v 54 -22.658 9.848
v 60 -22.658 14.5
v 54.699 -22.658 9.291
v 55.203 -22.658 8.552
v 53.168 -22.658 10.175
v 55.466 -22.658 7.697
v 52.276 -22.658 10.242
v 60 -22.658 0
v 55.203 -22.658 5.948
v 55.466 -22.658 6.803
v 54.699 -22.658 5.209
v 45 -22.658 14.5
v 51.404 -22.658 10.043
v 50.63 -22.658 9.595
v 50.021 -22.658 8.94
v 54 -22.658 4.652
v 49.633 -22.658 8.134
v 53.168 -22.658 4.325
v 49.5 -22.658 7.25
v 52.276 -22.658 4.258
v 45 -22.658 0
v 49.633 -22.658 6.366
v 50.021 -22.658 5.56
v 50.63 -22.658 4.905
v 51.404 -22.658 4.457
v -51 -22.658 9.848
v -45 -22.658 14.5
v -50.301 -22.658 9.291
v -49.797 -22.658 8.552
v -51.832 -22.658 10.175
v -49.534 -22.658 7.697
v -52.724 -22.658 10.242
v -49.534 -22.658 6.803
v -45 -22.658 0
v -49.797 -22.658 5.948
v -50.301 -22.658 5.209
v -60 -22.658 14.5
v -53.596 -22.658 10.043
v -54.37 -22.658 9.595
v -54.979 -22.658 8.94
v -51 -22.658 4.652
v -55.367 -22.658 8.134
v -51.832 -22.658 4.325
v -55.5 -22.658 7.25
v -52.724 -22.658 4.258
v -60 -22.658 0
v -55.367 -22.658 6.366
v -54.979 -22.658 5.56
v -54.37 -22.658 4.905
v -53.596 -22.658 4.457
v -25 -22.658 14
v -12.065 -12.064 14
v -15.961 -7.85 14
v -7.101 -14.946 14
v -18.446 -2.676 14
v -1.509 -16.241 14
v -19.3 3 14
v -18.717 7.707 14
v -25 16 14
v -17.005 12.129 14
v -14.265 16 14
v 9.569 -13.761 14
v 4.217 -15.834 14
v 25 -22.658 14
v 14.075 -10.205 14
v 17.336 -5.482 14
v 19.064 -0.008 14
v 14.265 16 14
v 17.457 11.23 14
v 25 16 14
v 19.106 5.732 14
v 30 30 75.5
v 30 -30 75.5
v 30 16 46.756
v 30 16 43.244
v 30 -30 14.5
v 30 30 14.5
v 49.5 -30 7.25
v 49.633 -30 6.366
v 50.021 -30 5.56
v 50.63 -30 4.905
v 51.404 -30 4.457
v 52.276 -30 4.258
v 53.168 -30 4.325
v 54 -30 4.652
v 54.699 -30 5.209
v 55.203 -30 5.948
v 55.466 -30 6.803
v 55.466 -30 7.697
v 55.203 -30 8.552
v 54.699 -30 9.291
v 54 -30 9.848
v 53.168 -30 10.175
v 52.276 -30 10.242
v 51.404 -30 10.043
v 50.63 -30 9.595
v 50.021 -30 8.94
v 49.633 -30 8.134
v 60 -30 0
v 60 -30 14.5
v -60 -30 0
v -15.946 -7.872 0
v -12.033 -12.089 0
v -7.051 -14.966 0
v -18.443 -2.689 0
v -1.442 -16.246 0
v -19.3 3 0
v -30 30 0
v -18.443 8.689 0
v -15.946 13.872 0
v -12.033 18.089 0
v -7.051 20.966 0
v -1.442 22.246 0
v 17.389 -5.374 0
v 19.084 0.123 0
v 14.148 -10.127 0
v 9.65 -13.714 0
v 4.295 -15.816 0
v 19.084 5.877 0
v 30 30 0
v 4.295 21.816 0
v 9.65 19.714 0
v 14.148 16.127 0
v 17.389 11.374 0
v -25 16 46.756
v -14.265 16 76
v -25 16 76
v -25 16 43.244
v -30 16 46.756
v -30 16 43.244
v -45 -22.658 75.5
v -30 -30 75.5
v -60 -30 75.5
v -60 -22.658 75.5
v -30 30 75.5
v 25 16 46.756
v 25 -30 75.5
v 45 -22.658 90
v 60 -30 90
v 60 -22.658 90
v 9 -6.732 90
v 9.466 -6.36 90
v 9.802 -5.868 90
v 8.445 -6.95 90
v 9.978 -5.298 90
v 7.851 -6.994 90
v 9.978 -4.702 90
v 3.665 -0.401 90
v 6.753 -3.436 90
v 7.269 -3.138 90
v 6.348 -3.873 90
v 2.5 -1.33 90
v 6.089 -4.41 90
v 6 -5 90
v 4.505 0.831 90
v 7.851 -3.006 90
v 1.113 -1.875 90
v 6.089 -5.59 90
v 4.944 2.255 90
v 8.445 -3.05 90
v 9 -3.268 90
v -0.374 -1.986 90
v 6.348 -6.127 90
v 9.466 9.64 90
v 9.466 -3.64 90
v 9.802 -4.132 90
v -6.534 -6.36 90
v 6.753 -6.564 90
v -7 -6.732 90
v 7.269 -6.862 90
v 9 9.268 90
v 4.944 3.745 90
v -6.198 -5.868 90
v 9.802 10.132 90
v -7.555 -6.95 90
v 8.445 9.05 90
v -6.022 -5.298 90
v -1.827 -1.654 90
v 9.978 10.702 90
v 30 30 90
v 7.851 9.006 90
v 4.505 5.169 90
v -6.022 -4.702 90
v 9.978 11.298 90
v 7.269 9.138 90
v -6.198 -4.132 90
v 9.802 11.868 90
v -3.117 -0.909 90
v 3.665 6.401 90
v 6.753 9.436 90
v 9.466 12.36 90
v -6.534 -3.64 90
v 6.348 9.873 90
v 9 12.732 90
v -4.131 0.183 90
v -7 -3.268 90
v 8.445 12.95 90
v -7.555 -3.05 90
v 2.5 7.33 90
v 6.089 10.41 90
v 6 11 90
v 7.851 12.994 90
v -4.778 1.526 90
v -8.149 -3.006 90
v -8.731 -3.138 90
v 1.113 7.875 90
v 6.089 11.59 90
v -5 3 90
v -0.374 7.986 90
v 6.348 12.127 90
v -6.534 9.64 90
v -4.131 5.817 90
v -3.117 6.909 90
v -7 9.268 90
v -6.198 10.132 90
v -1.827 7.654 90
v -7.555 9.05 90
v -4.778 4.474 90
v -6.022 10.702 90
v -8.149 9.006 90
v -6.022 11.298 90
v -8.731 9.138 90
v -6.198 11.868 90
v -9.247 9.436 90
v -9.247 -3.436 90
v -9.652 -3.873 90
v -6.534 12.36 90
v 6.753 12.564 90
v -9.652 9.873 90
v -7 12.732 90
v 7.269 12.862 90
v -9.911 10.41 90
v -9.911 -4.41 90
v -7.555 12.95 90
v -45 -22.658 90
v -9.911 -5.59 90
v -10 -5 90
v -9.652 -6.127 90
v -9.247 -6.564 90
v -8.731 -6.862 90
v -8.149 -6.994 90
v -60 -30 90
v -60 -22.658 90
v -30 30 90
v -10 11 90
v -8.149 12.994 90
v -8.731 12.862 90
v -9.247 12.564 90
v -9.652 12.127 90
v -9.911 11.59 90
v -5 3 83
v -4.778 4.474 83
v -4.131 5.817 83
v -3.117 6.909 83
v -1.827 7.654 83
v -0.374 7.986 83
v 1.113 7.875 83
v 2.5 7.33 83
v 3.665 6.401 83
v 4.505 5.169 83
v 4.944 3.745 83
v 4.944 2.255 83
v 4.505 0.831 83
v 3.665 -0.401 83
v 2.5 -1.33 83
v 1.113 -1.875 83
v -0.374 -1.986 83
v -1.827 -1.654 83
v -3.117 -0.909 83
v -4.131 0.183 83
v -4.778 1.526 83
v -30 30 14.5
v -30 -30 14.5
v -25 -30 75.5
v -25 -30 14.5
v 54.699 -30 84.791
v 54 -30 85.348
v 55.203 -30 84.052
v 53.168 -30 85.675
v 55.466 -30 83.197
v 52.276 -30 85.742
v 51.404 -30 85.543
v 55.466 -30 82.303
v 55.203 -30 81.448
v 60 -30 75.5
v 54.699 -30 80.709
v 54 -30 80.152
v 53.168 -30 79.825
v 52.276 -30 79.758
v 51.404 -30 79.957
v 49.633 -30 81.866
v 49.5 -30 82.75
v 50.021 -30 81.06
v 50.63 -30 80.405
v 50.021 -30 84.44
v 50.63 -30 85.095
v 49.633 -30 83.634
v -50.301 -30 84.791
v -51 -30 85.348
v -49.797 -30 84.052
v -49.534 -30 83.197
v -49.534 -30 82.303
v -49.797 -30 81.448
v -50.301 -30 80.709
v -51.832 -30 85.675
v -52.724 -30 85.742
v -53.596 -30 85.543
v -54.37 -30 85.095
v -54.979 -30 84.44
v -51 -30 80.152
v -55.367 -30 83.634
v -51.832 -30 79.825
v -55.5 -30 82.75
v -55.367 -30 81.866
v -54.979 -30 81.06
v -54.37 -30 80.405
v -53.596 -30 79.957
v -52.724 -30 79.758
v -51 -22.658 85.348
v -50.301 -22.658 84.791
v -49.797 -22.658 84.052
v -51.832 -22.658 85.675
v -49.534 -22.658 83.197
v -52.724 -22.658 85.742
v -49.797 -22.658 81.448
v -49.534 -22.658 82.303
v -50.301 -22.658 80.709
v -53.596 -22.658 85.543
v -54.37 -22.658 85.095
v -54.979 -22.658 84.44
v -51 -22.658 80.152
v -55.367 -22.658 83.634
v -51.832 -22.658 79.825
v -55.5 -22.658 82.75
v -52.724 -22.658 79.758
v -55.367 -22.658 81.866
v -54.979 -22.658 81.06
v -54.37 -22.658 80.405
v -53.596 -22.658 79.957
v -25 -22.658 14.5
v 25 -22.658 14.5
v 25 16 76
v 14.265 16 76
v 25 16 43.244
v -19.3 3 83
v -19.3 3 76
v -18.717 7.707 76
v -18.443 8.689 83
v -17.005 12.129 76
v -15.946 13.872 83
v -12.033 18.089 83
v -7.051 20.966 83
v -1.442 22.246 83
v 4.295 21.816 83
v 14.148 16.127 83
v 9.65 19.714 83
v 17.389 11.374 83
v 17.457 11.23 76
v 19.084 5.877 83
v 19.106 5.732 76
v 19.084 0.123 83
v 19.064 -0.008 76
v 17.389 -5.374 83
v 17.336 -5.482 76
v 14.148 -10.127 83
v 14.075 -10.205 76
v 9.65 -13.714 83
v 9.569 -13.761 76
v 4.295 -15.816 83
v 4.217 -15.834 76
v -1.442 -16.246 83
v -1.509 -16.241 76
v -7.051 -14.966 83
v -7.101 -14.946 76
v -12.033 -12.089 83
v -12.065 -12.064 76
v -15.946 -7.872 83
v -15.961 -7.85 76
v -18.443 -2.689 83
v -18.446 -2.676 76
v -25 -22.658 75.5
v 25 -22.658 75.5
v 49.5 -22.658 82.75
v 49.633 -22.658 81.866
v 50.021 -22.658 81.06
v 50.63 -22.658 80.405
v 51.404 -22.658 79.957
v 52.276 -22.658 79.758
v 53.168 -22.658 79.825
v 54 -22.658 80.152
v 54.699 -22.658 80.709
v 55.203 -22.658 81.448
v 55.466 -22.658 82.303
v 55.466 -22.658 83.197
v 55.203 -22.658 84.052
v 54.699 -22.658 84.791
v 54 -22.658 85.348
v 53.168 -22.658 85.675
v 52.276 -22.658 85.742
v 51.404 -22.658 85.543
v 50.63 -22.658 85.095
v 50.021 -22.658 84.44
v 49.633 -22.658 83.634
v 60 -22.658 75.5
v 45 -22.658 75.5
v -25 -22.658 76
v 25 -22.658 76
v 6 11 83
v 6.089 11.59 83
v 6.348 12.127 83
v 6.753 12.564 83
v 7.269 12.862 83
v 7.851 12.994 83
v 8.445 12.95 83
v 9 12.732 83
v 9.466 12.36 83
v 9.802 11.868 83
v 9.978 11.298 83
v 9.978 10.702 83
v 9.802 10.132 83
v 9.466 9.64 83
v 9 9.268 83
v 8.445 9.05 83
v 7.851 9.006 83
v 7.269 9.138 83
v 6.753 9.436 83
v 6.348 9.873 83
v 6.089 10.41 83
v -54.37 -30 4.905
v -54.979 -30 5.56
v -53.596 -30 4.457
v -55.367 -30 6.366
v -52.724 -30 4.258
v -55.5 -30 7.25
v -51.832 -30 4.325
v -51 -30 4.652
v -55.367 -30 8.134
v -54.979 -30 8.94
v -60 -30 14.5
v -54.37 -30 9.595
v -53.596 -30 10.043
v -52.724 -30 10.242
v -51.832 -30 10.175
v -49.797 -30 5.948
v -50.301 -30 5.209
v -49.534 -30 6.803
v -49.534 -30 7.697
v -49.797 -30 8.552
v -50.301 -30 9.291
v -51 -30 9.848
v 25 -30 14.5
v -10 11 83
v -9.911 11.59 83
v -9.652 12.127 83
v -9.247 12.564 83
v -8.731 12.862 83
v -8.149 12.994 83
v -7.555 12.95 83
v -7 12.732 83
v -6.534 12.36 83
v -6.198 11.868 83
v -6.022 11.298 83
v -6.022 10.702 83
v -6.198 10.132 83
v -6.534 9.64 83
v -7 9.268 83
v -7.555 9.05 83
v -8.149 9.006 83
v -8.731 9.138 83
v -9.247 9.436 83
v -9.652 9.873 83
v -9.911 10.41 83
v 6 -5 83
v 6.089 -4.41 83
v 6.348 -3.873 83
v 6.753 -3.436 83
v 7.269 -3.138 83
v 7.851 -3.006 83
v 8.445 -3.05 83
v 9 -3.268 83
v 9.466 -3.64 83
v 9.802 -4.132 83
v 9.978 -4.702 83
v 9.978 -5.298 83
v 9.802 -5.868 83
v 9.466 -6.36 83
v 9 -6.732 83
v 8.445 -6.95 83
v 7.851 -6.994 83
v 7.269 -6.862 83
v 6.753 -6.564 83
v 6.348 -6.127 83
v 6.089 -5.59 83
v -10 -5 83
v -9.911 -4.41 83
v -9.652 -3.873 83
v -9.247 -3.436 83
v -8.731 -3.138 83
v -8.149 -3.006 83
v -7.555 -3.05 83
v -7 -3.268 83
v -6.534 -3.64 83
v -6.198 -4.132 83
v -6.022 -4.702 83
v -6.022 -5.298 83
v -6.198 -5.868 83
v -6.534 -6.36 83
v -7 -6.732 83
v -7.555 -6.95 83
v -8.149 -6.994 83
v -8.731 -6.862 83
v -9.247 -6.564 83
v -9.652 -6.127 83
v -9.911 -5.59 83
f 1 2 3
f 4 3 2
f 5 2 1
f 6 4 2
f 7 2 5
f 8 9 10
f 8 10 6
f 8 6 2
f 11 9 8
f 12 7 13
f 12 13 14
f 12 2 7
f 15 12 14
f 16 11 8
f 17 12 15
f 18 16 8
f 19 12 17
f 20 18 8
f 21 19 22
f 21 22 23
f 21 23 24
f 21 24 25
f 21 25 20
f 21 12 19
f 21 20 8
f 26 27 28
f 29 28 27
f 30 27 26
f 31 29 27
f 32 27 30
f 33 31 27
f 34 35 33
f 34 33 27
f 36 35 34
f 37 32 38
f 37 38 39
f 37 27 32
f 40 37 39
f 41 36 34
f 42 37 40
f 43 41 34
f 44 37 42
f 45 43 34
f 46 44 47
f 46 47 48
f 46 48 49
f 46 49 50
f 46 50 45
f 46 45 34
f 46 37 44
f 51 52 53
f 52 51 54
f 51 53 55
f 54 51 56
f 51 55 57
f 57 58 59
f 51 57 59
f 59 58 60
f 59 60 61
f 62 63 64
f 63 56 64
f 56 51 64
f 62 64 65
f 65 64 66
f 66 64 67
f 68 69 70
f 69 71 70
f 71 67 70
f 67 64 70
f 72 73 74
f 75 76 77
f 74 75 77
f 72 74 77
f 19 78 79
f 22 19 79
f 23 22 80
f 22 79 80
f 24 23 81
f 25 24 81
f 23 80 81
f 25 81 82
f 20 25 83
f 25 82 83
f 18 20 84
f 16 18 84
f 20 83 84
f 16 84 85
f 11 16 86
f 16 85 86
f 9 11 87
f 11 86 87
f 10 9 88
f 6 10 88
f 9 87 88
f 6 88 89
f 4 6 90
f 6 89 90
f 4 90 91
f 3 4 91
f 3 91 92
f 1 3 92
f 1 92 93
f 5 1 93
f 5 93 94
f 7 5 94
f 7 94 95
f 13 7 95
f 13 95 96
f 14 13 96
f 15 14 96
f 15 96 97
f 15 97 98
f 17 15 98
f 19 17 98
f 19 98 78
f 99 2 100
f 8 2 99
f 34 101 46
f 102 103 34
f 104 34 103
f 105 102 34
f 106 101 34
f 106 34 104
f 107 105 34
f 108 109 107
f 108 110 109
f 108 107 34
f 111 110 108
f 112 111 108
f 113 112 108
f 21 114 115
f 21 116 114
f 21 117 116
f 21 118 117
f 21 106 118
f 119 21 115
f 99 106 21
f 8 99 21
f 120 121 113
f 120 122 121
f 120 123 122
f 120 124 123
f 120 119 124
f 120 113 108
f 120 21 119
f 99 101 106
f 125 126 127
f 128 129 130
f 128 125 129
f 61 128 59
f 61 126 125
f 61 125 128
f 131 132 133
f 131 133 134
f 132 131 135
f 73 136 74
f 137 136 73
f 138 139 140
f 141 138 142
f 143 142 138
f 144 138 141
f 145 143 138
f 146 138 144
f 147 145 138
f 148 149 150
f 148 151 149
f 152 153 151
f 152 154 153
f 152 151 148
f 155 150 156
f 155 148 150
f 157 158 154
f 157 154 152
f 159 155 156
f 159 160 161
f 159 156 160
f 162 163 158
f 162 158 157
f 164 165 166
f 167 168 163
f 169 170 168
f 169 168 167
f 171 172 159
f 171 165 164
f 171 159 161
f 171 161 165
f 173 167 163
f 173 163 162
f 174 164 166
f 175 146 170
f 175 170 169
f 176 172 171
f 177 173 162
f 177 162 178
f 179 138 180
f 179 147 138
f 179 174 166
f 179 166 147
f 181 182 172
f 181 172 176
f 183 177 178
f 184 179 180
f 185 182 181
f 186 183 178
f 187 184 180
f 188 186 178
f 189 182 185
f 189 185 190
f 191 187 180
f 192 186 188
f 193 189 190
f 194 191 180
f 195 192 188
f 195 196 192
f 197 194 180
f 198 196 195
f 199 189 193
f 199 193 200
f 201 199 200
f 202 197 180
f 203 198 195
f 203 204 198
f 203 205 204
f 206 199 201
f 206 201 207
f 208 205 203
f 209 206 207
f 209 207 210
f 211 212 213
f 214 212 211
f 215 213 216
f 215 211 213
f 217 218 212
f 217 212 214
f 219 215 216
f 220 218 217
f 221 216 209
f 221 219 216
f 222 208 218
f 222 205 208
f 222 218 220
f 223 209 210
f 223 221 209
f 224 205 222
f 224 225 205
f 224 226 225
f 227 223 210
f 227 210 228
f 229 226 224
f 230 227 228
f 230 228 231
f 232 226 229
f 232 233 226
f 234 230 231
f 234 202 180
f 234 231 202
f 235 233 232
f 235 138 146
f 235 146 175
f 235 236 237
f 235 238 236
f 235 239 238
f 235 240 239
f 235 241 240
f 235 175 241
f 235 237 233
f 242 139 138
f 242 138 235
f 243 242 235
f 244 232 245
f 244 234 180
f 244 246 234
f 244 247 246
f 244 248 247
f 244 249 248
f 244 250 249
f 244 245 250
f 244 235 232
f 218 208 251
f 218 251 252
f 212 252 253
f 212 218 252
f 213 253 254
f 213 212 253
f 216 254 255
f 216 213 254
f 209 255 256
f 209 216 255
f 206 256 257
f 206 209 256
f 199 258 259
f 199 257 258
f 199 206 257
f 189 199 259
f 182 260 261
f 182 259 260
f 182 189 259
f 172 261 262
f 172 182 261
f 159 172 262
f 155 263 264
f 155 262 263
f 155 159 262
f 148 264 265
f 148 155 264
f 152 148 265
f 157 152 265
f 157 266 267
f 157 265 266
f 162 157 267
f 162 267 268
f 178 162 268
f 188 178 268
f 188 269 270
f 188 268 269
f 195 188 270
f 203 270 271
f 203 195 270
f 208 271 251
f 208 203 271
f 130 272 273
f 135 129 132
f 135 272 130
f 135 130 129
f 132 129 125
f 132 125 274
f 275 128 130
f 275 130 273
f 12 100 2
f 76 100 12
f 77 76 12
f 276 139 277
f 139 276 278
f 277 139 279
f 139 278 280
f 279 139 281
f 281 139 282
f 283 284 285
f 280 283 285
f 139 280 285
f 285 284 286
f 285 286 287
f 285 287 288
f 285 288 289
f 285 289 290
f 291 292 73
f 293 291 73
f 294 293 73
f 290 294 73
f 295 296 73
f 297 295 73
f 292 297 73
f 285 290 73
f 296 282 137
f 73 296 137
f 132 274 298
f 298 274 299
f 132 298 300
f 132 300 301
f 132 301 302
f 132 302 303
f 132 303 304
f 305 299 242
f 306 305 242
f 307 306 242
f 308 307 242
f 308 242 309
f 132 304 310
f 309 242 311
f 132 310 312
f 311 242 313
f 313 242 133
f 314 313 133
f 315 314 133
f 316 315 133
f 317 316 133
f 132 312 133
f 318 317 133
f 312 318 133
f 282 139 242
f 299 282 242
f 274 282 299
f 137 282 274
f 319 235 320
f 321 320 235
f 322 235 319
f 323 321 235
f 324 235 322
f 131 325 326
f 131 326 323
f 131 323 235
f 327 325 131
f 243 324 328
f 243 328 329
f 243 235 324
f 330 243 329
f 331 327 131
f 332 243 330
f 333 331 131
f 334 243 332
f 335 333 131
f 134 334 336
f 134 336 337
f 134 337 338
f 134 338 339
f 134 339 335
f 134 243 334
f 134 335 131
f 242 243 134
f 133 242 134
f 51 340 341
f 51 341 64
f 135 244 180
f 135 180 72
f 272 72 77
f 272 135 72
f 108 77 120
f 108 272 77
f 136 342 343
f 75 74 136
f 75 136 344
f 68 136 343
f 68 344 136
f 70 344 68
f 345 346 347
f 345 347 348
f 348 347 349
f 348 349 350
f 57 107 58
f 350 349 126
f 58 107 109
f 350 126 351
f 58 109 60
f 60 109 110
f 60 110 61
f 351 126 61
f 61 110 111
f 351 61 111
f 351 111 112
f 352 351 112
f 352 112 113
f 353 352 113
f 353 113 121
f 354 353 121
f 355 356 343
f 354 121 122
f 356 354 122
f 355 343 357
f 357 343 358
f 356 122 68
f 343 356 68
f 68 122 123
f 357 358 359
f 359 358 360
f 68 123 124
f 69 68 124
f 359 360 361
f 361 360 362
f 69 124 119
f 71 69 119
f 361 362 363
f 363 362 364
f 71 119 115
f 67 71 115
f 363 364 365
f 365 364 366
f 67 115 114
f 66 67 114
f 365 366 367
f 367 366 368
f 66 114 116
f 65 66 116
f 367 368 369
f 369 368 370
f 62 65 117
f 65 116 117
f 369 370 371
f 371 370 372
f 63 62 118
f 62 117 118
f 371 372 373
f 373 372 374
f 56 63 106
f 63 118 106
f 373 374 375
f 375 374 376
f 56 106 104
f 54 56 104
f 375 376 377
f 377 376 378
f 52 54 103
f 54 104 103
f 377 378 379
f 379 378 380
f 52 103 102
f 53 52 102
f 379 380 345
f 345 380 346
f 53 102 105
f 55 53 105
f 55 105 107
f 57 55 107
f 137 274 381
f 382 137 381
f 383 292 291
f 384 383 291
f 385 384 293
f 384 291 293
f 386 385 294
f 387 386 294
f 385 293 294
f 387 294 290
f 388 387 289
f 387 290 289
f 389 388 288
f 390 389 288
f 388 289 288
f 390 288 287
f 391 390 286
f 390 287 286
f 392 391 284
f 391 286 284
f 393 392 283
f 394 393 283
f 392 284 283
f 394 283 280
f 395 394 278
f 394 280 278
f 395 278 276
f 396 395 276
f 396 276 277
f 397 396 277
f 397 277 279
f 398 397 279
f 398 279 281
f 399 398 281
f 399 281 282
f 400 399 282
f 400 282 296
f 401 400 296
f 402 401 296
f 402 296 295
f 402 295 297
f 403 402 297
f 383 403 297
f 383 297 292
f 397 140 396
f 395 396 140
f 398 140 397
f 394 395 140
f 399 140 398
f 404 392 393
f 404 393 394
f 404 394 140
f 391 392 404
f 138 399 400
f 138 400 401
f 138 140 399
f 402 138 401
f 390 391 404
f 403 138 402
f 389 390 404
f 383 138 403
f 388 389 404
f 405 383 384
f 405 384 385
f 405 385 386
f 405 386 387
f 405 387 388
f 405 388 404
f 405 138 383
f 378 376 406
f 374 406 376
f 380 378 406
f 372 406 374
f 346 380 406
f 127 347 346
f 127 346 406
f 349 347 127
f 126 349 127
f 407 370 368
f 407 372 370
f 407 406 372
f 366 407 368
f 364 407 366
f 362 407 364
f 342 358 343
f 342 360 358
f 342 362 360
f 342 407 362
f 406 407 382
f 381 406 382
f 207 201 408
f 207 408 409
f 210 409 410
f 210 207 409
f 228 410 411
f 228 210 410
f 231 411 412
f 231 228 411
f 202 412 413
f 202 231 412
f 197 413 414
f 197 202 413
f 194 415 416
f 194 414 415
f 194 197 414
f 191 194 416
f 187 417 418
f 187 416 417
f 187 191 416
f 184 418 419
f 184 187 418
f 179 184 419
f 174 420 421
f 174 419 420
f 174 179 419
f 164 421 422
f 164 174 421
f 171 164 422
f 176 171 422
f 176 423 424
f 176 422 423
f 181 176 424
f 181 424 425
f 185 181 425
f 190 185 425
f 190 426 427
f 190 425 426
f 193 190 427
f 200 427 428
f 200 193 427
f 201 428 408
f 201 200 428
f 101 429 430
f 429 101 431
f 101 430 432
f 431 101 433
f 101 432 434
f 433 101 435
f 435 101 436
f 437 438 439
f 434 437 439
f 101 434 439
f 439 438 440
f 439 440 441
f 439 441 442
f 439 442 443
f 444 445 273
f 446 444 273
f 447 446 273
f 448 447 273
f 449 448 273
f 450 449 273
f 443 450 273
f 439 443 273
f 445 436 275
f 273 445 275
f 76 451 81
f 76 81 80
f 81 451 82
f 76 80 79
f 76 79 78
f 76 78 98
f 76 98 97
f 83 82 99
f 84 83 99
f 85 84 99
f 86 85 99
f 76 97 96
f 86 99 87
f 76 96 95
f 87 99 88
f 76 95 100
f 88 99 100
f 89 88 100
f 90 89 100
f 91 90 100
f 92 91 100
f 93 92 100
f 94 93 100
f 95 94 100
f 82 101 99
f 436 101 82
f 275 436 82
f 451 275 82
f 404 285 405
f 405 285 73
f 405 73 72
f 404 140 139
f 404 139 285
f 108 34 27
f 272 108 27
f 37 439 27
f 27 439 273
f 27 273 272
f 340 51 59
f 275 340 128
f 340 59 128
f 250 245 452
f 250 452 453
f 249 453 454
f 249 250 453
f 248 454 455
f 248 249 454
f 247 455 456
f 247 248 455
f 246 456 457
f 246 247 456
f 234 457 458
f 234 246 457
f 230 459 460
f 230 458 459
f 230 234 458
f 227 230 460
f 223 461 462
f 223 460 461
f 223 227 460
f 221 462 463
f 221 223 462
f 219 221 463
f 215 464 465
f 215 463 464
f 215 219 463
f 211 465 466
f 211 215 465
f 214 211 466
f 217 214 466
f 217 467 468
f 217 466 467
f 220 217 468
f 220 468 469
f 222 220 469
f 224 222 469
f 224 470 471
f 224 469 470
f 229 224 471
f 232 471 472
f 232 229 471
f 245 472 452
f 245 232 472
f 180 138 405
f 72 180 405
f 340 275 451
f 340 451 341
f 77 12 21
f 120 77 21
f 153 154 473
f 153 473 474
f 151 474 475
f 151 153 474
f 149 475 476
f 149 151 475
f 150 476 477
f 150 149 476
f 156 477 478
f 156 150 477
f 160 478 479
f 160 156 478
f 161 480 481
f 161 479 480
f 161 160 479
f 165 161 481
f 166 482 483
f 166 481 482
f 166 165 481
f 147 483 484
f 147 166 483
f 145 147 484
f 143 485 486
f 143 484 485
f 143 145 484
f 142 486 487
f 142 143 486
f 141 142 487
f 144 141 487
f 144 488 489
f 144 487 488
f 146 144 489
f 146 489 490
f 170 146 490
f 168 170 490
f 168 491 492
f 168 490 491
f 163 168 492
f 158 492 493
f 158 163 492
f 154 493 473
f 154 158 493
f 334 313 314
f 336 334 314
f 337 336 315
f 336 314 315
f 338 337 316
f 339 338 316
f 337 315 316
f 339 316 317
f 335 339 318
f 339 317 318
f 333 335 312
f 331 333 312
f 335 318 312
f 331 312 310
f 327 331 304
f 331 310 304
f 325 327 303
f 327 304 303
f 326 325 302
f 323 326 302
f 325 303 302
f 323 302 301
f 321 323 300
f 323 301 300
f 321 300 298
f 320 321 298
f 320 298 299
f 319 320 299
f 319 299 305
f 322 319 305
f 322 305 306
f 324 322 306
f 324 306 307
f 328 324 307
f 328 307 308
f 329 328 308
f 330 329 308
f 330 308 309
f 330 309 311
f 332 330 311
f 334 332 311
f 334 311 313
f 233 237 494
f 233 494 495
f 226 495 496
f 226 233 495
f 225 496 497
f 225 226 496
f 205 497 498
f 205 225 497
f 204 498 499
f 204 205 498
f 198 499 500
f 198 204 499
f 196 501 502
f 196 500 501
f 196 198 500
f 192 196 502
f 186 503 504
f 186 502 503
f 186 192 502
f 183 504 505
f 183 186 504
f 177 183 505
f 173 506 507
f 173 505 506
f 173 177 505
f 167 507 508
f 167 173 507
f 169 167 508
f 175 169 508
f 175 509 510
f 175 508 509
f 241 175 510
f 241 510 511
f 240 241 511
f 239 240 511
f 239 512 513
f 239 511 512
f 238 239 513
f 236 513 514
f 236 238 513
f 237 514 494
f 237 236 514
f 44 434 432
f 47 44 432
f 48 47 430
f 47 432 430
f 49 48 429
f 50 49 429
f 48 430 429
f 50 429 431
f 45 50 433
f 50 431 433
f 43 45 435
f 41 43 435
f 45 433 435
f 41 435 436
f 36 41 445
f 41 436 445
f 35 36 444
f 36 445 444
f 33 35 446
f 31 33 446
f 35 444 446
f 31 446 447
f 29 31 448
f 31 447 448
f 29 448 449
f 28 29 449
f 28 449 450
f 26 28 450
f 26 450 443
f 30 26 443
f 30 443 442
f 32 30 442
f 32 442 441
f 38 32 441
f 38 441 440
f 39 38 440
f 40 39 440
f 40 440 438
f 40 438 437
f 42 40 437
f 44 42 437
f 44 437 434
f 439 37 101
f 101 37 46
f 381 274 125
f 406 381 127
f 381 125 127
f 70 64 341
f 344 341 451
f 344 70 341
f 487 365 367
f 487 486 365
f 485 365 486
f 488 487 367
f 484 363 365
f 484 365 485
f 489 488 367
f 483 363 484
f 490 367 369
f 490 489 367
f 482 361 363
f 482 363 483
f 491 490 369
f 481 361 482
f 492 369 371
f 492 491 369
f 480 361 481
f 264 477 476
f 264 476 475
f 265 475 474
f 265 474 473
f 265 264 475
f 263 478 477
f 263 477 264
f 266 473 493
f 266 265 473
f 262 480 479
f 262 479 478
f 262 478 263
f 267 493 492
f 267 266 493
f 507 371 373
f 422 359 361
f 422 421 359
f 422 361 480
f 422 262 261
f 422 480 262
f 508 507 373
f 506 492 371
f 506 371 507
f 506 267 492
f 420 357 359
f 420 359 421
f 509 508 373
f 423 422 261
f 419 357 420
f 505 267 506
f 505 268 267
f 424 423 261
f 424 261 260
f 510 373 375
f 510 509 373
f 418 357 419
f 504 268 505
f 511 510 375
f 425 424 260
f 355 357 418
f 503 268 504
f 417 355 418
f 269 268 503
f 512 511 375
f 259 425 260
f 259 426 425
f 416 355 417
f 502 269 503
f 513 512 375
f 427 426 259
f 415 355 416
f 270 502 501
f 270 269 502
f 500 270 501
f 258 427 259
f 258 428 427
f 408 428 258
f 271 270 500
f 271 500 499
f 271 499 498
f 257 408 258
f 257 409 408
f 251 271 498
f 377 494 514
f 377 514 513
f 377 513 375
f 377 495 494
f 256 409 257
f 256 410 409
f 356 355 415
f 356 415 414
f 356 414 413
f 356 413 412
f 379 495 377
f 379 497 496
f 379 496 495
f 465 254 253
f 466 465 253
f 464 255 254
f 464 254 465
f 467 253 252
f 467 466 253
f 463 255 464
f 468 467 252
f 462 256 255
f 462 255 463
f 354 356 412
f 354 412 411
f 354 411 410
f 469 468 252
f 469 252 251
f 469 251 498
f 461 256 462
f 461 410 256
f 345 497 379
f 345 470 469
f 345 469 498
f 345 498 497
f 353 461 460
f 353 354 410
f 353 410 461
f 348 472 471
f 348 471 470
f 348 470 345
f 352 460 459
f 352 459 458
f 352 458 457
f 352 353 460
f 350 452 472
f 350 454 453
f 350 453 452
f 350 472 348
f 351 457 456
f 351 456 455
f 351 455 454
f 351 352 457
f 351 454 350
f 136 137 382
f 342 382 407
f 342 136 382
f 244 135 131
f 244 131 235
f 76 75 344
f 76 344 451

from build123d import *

# Parameters (mm, degrees)
SKETCH1_W                = 60
SKETCH1_H                = 60
BOSS_EXTRUDE1_DEPTH      = 90
CUT_EXTRUDE4_DEPTH       = 100.498743711
CUT_EXTRUDE4_DEPTH_BACK  = 100.498743711
SKETCH5_R                = 2
SKETCH5_R_2              = 5
CUT_EXTRUDE6_DEPTH       = 113.249721603
CUT_EXTRUDE6_DEPTH_BACK  = 113.249721603
SKETCH7_W                = 62
SKETCH7_H                = 50
SKETCH8_R                = 19.3
CUT_EXTRUDE7_DEPTH       = 83
SKETCH10_W               = 5
SKETCH10_H               = 30.5
BOSS_EXTRUDE2_DEPTH      = 46
CHAMFER1_SIZE            = 48.010035871
CHAMFER1_SIZE_2          = 30
SKETCH11_W               = 14.5
SKETCH11_H               = 60
BOSS_EXTRUDE3_DEPTH      = 15
SKETCH12_W               = 14.5
SKETCH12_H               = 60
BOSS_EXTRUDE4_DEPTH      = 15
CHAMFER2_SIZE            = 15
CHAMFER2_SIZE2           = 52.65790913
BOSS_EXTRUDE5_DEPTH      = 15
BOSS_EXTRUDE5_DEPTH_BACK = 105
SKETCH13_W               = 14.5
SKETCH13_H               = 7.34209087
F_6_0MM_DOWEL_HOLE1_D    = 6


with BuildPart() as part:
    # Sketch1 → Boss-Extrude1 (new body)
    with BuildSketch(Plane.XY):
        Rectangle(SKETCH1_W, SKETCH1_H)
    extrude(amount=BOSS_EXTRUDE1_DEPTH)

    # Sketch5 → Cut-Extrude4 (cut, two sides: drawn at the far end of the back side and taken through both)
    with BuildSketch(Plane(origin=(0, 0, 0), x_dir=(-1, 0, 0), z_dir=(0, 0, -1)).offset(-CUT_EXTRUDE4_DEPTH_BACK)):
        with Locations((-8, 11)):
            Circle(SKETCH5_R)
        with Locations((8, 11)):
            Circle(SKETCH5_R)
        with Locations((8, -5)):
            Circle(SKETCH5_R)
        with Locations((-8, -5)):
            Circle(SKETCH5_R)
        with Locations((0, 3)):
            Circle(SKETCH5_R_2)
    extrude(amount=CUT_EXTRUDE4_DEPTH + CUT_EXTRUDE4_DEPTH_BACK, mode=Mode.SUBTRACT)

    # Sketch7 → Cut-Extrude6 (cut, two sides: drawn at the far end of the back side and taken through both)
    with BuildSketch(Plane.ZY.offset(30).offset(-CUT_EXTRUDE6_DEPTH_BACK)):
        with Locations((45, -9)):
            Rectangle(SKETCH7_W, SKETCH7_H)
    extrude(amount=CUT_EXTRUDE6_DEPTH + CUT_EXTRUDE6_DEPTH_BACK, mode=Mode.SUBTRACT)

    # Sketch8 → Cut-Extrude7 (cut)
    with BuildSketch(Plane(origin=(0, 0, 0), x_dir=(-1, 0, 0), z_dir=(0, 0, -1))):
        with Locations((0, 3)):
            Circle(SKETCH8_R)
    extrude(amount=-CUT_EXTRUDE7_DEPTH, mode=Mode.SUBTRACT)

    # Sketch10 → Boss-Extrude2 (add)
    with BuildSketch(Plane.XZ.offset(-16)):
        with Locations((-27.5, 60.75)):
            Rectangle(SKETCH10_W, SKETCH10_H)
        with Locations((-27.5, 29.25)):
            Rectangle(SKETCH10_W, SKETCH10_H)
        with Locations((27.5, 60.75)):
            Rectangle(SKETCH10_W, SKETCH10_H)
        with Locations((27.5, 29.25)):
            Rectangle(SKETCH10_W, SKETCH10_H)
    extrude(amount=BOSS_EXTRUDE2_DEPTH)

    # Chamfer1
    # the kernel refuses this chamfer: 48.010035871, 30 mm, written as the material it takes off along each edge
    with BuildSketch(Plane(origin=(99.122648056, -30, 44.5), x_dir=(0, 0.9997899140358645, 0.02049701910421798), z_dir=(-1, 0, 0))) as chamfer1_piece_1_section:
        Polygon((CHAMFER1_SIZE * 0.999789914041, CHAMFER1_SIZE * 0.0204970191043), (-CHAMFER1_SIZE_2 * 0.0204970191042, CHAMFER1_SIZE_2 * 0.999789914036), (0, 0), align=None)
    chamfer1_piece_1 = extrude(amount=253.245296112, mode=Mode.PRIVATE)
    chamfer1_piece_1 = split(chamfer1_piece_1, bisect_by=Plane(origin=(-27.5, 16, 34.735639976), z_dir=(0, -1, 0)), keep=Keep.TOP, mode=Mode.PRIVATE)
    add(chamfer1_piece_1, mode=Mode.SUBTRACT)
    with BuildSketch(Plane(origin=(-99.122648056, -30, 44.5), x_dir=(0, 0.9997899140358645, 0.02049701910421798), z_dir=(1, 0, 0))) as chamfer1_piece_2_section:
        Polygon((CHAMFER1_SIZE * 0.999789914041, -CHAMFER1_SIZE * 0.0204970191043), (-CHAMFER1_SIZE_2 * 0.0204970191042, -CHAMFER1_SIZE_2 * 0.999789914036), (0, 0), align=None)
    chamfer1_piece_2 = extrude(amount=253.245296112, mode=Mode.PRIVATE)
    chamfer1_piece_2 = split(chamfer1_piece_2, bisect_by=Plane(origin=(27.5, 16, 34.735639976), z_dir=(0, -1, 0)), keep=Keep.TOP, mode=Mode.PRIVATE)
    add(chamfer1_piece_2, mode=Mode.SUBTRACT)
    with BuildSketch(Plane(origin=(-99.122648056, -30, 45.5), x_dir=(0, 0.9997899140358645, -0.020497019104217966), z_dir=(1, 0, 0))) as chamfer1_piece_3_section:
        Polygon((CHAMFER1_SIZE * 0.999789914041, CHAMFER1_SIZE * 0.0204970191043), (-CHAMFER1_SIZE_2 * 0.0204970191042, CHAMFER1_SIZE_2 * 0.999789914036), (0, 0), align=None)
    chamfer1_piece_3 = extrude(amount=253.245296112, mode=Mode.PRIVATE)
    chamfer1_piece_3 = split(chamfer1_piece_3, bisect_by=Plane(origin=(27.5, 16, 55.264360024), z_dir=(0, -1, 0)), keep=Keep.TOP, mode=Mode.PRIVATE)
    add(chamfer1_piece_3, mode=Mode.SUBTRACT)
    with BuildSketch(Plane(origin=(99.122648056, -30, 45.5), x_dir=(0, -0.05243311939005598, 0.9986244379099823), z_dir=(-1, 0, 0))) as chamfer1_piece_4_section:
        Polygon((CHAMFER1_SIZE_2 * 0.99862443791, CHAMFER1_SIZE_2 * 0.0524331193901), (-CHAMFER1_SIZE * 0.0524331193903, CHAMFER1_SIZE * 0.998624437915), (0, 0), align=None)
    chamfer1_piece_4 = extrude(amount=253.245296112, mode=Mode.PRIVATE)
    chamfer1_piece_4 = split(chamfer1_piece_4, bisect_by=Plane(origin=(-27.5, 16, 55.264360024), z_dir=(0, -1, 0)), keep=Keep.TOP, mode=Mode.PRIVATE)
    add(chamfer1_piece_4, mode=Mode.SUBTRACT)

    # Sketch11 → Boss-Extrude3 (add)
    with BuildSketch(Plane.ZY.offset(30)):
        with Locations((7.25, 0)):
            Rectangle(SKETCH11_W, SKETCH11_H)
        with Locations((82.75, 0)):
            Rectangle(SKETCH11_W, SKETCH11_H)
    extrude(amount=BOSS_EXTRUDE3_DEPTH)

    # Sketch12 → Boss-Extrude4 (add)
    with BuildSketch(Plane(origin=(30, 0, 0), x_dir=(0, 0, -1), z_dir=(1, 0, 0))):
        with Locations((-82.75, 0)):
            Rectangle(SKETCH12_W, SKETCH12_H)
        with Locations((-7.25, 0)):
            Rectangle(SKETCH12_W, SKETCH12_H)
    extrude(amount=BOSS_EXTRUDE4_DEPTH)

    # Chamfer2
    chamfer2_edges = [part.edges().sort_by_distance(p)[0] for p in [
        (-45, 30, 7.25),
        (-45, 30, 82.75),
        (45, 30, 82.75),
        (45, 30, 7.25),
    ]]
    chamfer2_side = [part.faces().sort_by_distance(p)[0] for p in [
        (0, 30, 45),
    ]]
    chamfer(chamfer2_edges, length=CHAMFER2_SIZE, length2=CHAMFER2_SIZE2, reference=chamfer2_side[0])

    # Sketch13 → Boss-Extrude5 (add, two sides: drawn at the far end of the back side and taken through both)
    with BuildSketch(Plane(origin=(45, 0, 0), x_dir=(0, 0, -1), z_dir=(1, 0, 0)).offset(-BOSS_EXTRUDE5_DEPTH_BACK)):
        with Locations((-82.75, -26.328954565)):
            Rectangle(SKETCH13_W, SKETCH13_H)
        with Locations((-7.25, -26.328954565)):
            Rectangle(SKETCH13_W, SKETCH13_H)
    extrude(amount=BOSS_EXTRUDE5_DEPTH + BOSS_EXTRUDE5_DEPTH_BACK)

    # Ø6.0mm Dowel Hole1 (through all)
    with Locations(Plane(origin=(52.5, -22.65790913, 82.75), x_dir=(1, 0, 0), z_dir=(0, 1, 0))):
        with Locations((0, 0), (0, 75.5), (-105, 75.5), (-105, 0)):
            Hole(F_6_0MM_DOWEL_HOLE1_D / 2)


solid = part.part
